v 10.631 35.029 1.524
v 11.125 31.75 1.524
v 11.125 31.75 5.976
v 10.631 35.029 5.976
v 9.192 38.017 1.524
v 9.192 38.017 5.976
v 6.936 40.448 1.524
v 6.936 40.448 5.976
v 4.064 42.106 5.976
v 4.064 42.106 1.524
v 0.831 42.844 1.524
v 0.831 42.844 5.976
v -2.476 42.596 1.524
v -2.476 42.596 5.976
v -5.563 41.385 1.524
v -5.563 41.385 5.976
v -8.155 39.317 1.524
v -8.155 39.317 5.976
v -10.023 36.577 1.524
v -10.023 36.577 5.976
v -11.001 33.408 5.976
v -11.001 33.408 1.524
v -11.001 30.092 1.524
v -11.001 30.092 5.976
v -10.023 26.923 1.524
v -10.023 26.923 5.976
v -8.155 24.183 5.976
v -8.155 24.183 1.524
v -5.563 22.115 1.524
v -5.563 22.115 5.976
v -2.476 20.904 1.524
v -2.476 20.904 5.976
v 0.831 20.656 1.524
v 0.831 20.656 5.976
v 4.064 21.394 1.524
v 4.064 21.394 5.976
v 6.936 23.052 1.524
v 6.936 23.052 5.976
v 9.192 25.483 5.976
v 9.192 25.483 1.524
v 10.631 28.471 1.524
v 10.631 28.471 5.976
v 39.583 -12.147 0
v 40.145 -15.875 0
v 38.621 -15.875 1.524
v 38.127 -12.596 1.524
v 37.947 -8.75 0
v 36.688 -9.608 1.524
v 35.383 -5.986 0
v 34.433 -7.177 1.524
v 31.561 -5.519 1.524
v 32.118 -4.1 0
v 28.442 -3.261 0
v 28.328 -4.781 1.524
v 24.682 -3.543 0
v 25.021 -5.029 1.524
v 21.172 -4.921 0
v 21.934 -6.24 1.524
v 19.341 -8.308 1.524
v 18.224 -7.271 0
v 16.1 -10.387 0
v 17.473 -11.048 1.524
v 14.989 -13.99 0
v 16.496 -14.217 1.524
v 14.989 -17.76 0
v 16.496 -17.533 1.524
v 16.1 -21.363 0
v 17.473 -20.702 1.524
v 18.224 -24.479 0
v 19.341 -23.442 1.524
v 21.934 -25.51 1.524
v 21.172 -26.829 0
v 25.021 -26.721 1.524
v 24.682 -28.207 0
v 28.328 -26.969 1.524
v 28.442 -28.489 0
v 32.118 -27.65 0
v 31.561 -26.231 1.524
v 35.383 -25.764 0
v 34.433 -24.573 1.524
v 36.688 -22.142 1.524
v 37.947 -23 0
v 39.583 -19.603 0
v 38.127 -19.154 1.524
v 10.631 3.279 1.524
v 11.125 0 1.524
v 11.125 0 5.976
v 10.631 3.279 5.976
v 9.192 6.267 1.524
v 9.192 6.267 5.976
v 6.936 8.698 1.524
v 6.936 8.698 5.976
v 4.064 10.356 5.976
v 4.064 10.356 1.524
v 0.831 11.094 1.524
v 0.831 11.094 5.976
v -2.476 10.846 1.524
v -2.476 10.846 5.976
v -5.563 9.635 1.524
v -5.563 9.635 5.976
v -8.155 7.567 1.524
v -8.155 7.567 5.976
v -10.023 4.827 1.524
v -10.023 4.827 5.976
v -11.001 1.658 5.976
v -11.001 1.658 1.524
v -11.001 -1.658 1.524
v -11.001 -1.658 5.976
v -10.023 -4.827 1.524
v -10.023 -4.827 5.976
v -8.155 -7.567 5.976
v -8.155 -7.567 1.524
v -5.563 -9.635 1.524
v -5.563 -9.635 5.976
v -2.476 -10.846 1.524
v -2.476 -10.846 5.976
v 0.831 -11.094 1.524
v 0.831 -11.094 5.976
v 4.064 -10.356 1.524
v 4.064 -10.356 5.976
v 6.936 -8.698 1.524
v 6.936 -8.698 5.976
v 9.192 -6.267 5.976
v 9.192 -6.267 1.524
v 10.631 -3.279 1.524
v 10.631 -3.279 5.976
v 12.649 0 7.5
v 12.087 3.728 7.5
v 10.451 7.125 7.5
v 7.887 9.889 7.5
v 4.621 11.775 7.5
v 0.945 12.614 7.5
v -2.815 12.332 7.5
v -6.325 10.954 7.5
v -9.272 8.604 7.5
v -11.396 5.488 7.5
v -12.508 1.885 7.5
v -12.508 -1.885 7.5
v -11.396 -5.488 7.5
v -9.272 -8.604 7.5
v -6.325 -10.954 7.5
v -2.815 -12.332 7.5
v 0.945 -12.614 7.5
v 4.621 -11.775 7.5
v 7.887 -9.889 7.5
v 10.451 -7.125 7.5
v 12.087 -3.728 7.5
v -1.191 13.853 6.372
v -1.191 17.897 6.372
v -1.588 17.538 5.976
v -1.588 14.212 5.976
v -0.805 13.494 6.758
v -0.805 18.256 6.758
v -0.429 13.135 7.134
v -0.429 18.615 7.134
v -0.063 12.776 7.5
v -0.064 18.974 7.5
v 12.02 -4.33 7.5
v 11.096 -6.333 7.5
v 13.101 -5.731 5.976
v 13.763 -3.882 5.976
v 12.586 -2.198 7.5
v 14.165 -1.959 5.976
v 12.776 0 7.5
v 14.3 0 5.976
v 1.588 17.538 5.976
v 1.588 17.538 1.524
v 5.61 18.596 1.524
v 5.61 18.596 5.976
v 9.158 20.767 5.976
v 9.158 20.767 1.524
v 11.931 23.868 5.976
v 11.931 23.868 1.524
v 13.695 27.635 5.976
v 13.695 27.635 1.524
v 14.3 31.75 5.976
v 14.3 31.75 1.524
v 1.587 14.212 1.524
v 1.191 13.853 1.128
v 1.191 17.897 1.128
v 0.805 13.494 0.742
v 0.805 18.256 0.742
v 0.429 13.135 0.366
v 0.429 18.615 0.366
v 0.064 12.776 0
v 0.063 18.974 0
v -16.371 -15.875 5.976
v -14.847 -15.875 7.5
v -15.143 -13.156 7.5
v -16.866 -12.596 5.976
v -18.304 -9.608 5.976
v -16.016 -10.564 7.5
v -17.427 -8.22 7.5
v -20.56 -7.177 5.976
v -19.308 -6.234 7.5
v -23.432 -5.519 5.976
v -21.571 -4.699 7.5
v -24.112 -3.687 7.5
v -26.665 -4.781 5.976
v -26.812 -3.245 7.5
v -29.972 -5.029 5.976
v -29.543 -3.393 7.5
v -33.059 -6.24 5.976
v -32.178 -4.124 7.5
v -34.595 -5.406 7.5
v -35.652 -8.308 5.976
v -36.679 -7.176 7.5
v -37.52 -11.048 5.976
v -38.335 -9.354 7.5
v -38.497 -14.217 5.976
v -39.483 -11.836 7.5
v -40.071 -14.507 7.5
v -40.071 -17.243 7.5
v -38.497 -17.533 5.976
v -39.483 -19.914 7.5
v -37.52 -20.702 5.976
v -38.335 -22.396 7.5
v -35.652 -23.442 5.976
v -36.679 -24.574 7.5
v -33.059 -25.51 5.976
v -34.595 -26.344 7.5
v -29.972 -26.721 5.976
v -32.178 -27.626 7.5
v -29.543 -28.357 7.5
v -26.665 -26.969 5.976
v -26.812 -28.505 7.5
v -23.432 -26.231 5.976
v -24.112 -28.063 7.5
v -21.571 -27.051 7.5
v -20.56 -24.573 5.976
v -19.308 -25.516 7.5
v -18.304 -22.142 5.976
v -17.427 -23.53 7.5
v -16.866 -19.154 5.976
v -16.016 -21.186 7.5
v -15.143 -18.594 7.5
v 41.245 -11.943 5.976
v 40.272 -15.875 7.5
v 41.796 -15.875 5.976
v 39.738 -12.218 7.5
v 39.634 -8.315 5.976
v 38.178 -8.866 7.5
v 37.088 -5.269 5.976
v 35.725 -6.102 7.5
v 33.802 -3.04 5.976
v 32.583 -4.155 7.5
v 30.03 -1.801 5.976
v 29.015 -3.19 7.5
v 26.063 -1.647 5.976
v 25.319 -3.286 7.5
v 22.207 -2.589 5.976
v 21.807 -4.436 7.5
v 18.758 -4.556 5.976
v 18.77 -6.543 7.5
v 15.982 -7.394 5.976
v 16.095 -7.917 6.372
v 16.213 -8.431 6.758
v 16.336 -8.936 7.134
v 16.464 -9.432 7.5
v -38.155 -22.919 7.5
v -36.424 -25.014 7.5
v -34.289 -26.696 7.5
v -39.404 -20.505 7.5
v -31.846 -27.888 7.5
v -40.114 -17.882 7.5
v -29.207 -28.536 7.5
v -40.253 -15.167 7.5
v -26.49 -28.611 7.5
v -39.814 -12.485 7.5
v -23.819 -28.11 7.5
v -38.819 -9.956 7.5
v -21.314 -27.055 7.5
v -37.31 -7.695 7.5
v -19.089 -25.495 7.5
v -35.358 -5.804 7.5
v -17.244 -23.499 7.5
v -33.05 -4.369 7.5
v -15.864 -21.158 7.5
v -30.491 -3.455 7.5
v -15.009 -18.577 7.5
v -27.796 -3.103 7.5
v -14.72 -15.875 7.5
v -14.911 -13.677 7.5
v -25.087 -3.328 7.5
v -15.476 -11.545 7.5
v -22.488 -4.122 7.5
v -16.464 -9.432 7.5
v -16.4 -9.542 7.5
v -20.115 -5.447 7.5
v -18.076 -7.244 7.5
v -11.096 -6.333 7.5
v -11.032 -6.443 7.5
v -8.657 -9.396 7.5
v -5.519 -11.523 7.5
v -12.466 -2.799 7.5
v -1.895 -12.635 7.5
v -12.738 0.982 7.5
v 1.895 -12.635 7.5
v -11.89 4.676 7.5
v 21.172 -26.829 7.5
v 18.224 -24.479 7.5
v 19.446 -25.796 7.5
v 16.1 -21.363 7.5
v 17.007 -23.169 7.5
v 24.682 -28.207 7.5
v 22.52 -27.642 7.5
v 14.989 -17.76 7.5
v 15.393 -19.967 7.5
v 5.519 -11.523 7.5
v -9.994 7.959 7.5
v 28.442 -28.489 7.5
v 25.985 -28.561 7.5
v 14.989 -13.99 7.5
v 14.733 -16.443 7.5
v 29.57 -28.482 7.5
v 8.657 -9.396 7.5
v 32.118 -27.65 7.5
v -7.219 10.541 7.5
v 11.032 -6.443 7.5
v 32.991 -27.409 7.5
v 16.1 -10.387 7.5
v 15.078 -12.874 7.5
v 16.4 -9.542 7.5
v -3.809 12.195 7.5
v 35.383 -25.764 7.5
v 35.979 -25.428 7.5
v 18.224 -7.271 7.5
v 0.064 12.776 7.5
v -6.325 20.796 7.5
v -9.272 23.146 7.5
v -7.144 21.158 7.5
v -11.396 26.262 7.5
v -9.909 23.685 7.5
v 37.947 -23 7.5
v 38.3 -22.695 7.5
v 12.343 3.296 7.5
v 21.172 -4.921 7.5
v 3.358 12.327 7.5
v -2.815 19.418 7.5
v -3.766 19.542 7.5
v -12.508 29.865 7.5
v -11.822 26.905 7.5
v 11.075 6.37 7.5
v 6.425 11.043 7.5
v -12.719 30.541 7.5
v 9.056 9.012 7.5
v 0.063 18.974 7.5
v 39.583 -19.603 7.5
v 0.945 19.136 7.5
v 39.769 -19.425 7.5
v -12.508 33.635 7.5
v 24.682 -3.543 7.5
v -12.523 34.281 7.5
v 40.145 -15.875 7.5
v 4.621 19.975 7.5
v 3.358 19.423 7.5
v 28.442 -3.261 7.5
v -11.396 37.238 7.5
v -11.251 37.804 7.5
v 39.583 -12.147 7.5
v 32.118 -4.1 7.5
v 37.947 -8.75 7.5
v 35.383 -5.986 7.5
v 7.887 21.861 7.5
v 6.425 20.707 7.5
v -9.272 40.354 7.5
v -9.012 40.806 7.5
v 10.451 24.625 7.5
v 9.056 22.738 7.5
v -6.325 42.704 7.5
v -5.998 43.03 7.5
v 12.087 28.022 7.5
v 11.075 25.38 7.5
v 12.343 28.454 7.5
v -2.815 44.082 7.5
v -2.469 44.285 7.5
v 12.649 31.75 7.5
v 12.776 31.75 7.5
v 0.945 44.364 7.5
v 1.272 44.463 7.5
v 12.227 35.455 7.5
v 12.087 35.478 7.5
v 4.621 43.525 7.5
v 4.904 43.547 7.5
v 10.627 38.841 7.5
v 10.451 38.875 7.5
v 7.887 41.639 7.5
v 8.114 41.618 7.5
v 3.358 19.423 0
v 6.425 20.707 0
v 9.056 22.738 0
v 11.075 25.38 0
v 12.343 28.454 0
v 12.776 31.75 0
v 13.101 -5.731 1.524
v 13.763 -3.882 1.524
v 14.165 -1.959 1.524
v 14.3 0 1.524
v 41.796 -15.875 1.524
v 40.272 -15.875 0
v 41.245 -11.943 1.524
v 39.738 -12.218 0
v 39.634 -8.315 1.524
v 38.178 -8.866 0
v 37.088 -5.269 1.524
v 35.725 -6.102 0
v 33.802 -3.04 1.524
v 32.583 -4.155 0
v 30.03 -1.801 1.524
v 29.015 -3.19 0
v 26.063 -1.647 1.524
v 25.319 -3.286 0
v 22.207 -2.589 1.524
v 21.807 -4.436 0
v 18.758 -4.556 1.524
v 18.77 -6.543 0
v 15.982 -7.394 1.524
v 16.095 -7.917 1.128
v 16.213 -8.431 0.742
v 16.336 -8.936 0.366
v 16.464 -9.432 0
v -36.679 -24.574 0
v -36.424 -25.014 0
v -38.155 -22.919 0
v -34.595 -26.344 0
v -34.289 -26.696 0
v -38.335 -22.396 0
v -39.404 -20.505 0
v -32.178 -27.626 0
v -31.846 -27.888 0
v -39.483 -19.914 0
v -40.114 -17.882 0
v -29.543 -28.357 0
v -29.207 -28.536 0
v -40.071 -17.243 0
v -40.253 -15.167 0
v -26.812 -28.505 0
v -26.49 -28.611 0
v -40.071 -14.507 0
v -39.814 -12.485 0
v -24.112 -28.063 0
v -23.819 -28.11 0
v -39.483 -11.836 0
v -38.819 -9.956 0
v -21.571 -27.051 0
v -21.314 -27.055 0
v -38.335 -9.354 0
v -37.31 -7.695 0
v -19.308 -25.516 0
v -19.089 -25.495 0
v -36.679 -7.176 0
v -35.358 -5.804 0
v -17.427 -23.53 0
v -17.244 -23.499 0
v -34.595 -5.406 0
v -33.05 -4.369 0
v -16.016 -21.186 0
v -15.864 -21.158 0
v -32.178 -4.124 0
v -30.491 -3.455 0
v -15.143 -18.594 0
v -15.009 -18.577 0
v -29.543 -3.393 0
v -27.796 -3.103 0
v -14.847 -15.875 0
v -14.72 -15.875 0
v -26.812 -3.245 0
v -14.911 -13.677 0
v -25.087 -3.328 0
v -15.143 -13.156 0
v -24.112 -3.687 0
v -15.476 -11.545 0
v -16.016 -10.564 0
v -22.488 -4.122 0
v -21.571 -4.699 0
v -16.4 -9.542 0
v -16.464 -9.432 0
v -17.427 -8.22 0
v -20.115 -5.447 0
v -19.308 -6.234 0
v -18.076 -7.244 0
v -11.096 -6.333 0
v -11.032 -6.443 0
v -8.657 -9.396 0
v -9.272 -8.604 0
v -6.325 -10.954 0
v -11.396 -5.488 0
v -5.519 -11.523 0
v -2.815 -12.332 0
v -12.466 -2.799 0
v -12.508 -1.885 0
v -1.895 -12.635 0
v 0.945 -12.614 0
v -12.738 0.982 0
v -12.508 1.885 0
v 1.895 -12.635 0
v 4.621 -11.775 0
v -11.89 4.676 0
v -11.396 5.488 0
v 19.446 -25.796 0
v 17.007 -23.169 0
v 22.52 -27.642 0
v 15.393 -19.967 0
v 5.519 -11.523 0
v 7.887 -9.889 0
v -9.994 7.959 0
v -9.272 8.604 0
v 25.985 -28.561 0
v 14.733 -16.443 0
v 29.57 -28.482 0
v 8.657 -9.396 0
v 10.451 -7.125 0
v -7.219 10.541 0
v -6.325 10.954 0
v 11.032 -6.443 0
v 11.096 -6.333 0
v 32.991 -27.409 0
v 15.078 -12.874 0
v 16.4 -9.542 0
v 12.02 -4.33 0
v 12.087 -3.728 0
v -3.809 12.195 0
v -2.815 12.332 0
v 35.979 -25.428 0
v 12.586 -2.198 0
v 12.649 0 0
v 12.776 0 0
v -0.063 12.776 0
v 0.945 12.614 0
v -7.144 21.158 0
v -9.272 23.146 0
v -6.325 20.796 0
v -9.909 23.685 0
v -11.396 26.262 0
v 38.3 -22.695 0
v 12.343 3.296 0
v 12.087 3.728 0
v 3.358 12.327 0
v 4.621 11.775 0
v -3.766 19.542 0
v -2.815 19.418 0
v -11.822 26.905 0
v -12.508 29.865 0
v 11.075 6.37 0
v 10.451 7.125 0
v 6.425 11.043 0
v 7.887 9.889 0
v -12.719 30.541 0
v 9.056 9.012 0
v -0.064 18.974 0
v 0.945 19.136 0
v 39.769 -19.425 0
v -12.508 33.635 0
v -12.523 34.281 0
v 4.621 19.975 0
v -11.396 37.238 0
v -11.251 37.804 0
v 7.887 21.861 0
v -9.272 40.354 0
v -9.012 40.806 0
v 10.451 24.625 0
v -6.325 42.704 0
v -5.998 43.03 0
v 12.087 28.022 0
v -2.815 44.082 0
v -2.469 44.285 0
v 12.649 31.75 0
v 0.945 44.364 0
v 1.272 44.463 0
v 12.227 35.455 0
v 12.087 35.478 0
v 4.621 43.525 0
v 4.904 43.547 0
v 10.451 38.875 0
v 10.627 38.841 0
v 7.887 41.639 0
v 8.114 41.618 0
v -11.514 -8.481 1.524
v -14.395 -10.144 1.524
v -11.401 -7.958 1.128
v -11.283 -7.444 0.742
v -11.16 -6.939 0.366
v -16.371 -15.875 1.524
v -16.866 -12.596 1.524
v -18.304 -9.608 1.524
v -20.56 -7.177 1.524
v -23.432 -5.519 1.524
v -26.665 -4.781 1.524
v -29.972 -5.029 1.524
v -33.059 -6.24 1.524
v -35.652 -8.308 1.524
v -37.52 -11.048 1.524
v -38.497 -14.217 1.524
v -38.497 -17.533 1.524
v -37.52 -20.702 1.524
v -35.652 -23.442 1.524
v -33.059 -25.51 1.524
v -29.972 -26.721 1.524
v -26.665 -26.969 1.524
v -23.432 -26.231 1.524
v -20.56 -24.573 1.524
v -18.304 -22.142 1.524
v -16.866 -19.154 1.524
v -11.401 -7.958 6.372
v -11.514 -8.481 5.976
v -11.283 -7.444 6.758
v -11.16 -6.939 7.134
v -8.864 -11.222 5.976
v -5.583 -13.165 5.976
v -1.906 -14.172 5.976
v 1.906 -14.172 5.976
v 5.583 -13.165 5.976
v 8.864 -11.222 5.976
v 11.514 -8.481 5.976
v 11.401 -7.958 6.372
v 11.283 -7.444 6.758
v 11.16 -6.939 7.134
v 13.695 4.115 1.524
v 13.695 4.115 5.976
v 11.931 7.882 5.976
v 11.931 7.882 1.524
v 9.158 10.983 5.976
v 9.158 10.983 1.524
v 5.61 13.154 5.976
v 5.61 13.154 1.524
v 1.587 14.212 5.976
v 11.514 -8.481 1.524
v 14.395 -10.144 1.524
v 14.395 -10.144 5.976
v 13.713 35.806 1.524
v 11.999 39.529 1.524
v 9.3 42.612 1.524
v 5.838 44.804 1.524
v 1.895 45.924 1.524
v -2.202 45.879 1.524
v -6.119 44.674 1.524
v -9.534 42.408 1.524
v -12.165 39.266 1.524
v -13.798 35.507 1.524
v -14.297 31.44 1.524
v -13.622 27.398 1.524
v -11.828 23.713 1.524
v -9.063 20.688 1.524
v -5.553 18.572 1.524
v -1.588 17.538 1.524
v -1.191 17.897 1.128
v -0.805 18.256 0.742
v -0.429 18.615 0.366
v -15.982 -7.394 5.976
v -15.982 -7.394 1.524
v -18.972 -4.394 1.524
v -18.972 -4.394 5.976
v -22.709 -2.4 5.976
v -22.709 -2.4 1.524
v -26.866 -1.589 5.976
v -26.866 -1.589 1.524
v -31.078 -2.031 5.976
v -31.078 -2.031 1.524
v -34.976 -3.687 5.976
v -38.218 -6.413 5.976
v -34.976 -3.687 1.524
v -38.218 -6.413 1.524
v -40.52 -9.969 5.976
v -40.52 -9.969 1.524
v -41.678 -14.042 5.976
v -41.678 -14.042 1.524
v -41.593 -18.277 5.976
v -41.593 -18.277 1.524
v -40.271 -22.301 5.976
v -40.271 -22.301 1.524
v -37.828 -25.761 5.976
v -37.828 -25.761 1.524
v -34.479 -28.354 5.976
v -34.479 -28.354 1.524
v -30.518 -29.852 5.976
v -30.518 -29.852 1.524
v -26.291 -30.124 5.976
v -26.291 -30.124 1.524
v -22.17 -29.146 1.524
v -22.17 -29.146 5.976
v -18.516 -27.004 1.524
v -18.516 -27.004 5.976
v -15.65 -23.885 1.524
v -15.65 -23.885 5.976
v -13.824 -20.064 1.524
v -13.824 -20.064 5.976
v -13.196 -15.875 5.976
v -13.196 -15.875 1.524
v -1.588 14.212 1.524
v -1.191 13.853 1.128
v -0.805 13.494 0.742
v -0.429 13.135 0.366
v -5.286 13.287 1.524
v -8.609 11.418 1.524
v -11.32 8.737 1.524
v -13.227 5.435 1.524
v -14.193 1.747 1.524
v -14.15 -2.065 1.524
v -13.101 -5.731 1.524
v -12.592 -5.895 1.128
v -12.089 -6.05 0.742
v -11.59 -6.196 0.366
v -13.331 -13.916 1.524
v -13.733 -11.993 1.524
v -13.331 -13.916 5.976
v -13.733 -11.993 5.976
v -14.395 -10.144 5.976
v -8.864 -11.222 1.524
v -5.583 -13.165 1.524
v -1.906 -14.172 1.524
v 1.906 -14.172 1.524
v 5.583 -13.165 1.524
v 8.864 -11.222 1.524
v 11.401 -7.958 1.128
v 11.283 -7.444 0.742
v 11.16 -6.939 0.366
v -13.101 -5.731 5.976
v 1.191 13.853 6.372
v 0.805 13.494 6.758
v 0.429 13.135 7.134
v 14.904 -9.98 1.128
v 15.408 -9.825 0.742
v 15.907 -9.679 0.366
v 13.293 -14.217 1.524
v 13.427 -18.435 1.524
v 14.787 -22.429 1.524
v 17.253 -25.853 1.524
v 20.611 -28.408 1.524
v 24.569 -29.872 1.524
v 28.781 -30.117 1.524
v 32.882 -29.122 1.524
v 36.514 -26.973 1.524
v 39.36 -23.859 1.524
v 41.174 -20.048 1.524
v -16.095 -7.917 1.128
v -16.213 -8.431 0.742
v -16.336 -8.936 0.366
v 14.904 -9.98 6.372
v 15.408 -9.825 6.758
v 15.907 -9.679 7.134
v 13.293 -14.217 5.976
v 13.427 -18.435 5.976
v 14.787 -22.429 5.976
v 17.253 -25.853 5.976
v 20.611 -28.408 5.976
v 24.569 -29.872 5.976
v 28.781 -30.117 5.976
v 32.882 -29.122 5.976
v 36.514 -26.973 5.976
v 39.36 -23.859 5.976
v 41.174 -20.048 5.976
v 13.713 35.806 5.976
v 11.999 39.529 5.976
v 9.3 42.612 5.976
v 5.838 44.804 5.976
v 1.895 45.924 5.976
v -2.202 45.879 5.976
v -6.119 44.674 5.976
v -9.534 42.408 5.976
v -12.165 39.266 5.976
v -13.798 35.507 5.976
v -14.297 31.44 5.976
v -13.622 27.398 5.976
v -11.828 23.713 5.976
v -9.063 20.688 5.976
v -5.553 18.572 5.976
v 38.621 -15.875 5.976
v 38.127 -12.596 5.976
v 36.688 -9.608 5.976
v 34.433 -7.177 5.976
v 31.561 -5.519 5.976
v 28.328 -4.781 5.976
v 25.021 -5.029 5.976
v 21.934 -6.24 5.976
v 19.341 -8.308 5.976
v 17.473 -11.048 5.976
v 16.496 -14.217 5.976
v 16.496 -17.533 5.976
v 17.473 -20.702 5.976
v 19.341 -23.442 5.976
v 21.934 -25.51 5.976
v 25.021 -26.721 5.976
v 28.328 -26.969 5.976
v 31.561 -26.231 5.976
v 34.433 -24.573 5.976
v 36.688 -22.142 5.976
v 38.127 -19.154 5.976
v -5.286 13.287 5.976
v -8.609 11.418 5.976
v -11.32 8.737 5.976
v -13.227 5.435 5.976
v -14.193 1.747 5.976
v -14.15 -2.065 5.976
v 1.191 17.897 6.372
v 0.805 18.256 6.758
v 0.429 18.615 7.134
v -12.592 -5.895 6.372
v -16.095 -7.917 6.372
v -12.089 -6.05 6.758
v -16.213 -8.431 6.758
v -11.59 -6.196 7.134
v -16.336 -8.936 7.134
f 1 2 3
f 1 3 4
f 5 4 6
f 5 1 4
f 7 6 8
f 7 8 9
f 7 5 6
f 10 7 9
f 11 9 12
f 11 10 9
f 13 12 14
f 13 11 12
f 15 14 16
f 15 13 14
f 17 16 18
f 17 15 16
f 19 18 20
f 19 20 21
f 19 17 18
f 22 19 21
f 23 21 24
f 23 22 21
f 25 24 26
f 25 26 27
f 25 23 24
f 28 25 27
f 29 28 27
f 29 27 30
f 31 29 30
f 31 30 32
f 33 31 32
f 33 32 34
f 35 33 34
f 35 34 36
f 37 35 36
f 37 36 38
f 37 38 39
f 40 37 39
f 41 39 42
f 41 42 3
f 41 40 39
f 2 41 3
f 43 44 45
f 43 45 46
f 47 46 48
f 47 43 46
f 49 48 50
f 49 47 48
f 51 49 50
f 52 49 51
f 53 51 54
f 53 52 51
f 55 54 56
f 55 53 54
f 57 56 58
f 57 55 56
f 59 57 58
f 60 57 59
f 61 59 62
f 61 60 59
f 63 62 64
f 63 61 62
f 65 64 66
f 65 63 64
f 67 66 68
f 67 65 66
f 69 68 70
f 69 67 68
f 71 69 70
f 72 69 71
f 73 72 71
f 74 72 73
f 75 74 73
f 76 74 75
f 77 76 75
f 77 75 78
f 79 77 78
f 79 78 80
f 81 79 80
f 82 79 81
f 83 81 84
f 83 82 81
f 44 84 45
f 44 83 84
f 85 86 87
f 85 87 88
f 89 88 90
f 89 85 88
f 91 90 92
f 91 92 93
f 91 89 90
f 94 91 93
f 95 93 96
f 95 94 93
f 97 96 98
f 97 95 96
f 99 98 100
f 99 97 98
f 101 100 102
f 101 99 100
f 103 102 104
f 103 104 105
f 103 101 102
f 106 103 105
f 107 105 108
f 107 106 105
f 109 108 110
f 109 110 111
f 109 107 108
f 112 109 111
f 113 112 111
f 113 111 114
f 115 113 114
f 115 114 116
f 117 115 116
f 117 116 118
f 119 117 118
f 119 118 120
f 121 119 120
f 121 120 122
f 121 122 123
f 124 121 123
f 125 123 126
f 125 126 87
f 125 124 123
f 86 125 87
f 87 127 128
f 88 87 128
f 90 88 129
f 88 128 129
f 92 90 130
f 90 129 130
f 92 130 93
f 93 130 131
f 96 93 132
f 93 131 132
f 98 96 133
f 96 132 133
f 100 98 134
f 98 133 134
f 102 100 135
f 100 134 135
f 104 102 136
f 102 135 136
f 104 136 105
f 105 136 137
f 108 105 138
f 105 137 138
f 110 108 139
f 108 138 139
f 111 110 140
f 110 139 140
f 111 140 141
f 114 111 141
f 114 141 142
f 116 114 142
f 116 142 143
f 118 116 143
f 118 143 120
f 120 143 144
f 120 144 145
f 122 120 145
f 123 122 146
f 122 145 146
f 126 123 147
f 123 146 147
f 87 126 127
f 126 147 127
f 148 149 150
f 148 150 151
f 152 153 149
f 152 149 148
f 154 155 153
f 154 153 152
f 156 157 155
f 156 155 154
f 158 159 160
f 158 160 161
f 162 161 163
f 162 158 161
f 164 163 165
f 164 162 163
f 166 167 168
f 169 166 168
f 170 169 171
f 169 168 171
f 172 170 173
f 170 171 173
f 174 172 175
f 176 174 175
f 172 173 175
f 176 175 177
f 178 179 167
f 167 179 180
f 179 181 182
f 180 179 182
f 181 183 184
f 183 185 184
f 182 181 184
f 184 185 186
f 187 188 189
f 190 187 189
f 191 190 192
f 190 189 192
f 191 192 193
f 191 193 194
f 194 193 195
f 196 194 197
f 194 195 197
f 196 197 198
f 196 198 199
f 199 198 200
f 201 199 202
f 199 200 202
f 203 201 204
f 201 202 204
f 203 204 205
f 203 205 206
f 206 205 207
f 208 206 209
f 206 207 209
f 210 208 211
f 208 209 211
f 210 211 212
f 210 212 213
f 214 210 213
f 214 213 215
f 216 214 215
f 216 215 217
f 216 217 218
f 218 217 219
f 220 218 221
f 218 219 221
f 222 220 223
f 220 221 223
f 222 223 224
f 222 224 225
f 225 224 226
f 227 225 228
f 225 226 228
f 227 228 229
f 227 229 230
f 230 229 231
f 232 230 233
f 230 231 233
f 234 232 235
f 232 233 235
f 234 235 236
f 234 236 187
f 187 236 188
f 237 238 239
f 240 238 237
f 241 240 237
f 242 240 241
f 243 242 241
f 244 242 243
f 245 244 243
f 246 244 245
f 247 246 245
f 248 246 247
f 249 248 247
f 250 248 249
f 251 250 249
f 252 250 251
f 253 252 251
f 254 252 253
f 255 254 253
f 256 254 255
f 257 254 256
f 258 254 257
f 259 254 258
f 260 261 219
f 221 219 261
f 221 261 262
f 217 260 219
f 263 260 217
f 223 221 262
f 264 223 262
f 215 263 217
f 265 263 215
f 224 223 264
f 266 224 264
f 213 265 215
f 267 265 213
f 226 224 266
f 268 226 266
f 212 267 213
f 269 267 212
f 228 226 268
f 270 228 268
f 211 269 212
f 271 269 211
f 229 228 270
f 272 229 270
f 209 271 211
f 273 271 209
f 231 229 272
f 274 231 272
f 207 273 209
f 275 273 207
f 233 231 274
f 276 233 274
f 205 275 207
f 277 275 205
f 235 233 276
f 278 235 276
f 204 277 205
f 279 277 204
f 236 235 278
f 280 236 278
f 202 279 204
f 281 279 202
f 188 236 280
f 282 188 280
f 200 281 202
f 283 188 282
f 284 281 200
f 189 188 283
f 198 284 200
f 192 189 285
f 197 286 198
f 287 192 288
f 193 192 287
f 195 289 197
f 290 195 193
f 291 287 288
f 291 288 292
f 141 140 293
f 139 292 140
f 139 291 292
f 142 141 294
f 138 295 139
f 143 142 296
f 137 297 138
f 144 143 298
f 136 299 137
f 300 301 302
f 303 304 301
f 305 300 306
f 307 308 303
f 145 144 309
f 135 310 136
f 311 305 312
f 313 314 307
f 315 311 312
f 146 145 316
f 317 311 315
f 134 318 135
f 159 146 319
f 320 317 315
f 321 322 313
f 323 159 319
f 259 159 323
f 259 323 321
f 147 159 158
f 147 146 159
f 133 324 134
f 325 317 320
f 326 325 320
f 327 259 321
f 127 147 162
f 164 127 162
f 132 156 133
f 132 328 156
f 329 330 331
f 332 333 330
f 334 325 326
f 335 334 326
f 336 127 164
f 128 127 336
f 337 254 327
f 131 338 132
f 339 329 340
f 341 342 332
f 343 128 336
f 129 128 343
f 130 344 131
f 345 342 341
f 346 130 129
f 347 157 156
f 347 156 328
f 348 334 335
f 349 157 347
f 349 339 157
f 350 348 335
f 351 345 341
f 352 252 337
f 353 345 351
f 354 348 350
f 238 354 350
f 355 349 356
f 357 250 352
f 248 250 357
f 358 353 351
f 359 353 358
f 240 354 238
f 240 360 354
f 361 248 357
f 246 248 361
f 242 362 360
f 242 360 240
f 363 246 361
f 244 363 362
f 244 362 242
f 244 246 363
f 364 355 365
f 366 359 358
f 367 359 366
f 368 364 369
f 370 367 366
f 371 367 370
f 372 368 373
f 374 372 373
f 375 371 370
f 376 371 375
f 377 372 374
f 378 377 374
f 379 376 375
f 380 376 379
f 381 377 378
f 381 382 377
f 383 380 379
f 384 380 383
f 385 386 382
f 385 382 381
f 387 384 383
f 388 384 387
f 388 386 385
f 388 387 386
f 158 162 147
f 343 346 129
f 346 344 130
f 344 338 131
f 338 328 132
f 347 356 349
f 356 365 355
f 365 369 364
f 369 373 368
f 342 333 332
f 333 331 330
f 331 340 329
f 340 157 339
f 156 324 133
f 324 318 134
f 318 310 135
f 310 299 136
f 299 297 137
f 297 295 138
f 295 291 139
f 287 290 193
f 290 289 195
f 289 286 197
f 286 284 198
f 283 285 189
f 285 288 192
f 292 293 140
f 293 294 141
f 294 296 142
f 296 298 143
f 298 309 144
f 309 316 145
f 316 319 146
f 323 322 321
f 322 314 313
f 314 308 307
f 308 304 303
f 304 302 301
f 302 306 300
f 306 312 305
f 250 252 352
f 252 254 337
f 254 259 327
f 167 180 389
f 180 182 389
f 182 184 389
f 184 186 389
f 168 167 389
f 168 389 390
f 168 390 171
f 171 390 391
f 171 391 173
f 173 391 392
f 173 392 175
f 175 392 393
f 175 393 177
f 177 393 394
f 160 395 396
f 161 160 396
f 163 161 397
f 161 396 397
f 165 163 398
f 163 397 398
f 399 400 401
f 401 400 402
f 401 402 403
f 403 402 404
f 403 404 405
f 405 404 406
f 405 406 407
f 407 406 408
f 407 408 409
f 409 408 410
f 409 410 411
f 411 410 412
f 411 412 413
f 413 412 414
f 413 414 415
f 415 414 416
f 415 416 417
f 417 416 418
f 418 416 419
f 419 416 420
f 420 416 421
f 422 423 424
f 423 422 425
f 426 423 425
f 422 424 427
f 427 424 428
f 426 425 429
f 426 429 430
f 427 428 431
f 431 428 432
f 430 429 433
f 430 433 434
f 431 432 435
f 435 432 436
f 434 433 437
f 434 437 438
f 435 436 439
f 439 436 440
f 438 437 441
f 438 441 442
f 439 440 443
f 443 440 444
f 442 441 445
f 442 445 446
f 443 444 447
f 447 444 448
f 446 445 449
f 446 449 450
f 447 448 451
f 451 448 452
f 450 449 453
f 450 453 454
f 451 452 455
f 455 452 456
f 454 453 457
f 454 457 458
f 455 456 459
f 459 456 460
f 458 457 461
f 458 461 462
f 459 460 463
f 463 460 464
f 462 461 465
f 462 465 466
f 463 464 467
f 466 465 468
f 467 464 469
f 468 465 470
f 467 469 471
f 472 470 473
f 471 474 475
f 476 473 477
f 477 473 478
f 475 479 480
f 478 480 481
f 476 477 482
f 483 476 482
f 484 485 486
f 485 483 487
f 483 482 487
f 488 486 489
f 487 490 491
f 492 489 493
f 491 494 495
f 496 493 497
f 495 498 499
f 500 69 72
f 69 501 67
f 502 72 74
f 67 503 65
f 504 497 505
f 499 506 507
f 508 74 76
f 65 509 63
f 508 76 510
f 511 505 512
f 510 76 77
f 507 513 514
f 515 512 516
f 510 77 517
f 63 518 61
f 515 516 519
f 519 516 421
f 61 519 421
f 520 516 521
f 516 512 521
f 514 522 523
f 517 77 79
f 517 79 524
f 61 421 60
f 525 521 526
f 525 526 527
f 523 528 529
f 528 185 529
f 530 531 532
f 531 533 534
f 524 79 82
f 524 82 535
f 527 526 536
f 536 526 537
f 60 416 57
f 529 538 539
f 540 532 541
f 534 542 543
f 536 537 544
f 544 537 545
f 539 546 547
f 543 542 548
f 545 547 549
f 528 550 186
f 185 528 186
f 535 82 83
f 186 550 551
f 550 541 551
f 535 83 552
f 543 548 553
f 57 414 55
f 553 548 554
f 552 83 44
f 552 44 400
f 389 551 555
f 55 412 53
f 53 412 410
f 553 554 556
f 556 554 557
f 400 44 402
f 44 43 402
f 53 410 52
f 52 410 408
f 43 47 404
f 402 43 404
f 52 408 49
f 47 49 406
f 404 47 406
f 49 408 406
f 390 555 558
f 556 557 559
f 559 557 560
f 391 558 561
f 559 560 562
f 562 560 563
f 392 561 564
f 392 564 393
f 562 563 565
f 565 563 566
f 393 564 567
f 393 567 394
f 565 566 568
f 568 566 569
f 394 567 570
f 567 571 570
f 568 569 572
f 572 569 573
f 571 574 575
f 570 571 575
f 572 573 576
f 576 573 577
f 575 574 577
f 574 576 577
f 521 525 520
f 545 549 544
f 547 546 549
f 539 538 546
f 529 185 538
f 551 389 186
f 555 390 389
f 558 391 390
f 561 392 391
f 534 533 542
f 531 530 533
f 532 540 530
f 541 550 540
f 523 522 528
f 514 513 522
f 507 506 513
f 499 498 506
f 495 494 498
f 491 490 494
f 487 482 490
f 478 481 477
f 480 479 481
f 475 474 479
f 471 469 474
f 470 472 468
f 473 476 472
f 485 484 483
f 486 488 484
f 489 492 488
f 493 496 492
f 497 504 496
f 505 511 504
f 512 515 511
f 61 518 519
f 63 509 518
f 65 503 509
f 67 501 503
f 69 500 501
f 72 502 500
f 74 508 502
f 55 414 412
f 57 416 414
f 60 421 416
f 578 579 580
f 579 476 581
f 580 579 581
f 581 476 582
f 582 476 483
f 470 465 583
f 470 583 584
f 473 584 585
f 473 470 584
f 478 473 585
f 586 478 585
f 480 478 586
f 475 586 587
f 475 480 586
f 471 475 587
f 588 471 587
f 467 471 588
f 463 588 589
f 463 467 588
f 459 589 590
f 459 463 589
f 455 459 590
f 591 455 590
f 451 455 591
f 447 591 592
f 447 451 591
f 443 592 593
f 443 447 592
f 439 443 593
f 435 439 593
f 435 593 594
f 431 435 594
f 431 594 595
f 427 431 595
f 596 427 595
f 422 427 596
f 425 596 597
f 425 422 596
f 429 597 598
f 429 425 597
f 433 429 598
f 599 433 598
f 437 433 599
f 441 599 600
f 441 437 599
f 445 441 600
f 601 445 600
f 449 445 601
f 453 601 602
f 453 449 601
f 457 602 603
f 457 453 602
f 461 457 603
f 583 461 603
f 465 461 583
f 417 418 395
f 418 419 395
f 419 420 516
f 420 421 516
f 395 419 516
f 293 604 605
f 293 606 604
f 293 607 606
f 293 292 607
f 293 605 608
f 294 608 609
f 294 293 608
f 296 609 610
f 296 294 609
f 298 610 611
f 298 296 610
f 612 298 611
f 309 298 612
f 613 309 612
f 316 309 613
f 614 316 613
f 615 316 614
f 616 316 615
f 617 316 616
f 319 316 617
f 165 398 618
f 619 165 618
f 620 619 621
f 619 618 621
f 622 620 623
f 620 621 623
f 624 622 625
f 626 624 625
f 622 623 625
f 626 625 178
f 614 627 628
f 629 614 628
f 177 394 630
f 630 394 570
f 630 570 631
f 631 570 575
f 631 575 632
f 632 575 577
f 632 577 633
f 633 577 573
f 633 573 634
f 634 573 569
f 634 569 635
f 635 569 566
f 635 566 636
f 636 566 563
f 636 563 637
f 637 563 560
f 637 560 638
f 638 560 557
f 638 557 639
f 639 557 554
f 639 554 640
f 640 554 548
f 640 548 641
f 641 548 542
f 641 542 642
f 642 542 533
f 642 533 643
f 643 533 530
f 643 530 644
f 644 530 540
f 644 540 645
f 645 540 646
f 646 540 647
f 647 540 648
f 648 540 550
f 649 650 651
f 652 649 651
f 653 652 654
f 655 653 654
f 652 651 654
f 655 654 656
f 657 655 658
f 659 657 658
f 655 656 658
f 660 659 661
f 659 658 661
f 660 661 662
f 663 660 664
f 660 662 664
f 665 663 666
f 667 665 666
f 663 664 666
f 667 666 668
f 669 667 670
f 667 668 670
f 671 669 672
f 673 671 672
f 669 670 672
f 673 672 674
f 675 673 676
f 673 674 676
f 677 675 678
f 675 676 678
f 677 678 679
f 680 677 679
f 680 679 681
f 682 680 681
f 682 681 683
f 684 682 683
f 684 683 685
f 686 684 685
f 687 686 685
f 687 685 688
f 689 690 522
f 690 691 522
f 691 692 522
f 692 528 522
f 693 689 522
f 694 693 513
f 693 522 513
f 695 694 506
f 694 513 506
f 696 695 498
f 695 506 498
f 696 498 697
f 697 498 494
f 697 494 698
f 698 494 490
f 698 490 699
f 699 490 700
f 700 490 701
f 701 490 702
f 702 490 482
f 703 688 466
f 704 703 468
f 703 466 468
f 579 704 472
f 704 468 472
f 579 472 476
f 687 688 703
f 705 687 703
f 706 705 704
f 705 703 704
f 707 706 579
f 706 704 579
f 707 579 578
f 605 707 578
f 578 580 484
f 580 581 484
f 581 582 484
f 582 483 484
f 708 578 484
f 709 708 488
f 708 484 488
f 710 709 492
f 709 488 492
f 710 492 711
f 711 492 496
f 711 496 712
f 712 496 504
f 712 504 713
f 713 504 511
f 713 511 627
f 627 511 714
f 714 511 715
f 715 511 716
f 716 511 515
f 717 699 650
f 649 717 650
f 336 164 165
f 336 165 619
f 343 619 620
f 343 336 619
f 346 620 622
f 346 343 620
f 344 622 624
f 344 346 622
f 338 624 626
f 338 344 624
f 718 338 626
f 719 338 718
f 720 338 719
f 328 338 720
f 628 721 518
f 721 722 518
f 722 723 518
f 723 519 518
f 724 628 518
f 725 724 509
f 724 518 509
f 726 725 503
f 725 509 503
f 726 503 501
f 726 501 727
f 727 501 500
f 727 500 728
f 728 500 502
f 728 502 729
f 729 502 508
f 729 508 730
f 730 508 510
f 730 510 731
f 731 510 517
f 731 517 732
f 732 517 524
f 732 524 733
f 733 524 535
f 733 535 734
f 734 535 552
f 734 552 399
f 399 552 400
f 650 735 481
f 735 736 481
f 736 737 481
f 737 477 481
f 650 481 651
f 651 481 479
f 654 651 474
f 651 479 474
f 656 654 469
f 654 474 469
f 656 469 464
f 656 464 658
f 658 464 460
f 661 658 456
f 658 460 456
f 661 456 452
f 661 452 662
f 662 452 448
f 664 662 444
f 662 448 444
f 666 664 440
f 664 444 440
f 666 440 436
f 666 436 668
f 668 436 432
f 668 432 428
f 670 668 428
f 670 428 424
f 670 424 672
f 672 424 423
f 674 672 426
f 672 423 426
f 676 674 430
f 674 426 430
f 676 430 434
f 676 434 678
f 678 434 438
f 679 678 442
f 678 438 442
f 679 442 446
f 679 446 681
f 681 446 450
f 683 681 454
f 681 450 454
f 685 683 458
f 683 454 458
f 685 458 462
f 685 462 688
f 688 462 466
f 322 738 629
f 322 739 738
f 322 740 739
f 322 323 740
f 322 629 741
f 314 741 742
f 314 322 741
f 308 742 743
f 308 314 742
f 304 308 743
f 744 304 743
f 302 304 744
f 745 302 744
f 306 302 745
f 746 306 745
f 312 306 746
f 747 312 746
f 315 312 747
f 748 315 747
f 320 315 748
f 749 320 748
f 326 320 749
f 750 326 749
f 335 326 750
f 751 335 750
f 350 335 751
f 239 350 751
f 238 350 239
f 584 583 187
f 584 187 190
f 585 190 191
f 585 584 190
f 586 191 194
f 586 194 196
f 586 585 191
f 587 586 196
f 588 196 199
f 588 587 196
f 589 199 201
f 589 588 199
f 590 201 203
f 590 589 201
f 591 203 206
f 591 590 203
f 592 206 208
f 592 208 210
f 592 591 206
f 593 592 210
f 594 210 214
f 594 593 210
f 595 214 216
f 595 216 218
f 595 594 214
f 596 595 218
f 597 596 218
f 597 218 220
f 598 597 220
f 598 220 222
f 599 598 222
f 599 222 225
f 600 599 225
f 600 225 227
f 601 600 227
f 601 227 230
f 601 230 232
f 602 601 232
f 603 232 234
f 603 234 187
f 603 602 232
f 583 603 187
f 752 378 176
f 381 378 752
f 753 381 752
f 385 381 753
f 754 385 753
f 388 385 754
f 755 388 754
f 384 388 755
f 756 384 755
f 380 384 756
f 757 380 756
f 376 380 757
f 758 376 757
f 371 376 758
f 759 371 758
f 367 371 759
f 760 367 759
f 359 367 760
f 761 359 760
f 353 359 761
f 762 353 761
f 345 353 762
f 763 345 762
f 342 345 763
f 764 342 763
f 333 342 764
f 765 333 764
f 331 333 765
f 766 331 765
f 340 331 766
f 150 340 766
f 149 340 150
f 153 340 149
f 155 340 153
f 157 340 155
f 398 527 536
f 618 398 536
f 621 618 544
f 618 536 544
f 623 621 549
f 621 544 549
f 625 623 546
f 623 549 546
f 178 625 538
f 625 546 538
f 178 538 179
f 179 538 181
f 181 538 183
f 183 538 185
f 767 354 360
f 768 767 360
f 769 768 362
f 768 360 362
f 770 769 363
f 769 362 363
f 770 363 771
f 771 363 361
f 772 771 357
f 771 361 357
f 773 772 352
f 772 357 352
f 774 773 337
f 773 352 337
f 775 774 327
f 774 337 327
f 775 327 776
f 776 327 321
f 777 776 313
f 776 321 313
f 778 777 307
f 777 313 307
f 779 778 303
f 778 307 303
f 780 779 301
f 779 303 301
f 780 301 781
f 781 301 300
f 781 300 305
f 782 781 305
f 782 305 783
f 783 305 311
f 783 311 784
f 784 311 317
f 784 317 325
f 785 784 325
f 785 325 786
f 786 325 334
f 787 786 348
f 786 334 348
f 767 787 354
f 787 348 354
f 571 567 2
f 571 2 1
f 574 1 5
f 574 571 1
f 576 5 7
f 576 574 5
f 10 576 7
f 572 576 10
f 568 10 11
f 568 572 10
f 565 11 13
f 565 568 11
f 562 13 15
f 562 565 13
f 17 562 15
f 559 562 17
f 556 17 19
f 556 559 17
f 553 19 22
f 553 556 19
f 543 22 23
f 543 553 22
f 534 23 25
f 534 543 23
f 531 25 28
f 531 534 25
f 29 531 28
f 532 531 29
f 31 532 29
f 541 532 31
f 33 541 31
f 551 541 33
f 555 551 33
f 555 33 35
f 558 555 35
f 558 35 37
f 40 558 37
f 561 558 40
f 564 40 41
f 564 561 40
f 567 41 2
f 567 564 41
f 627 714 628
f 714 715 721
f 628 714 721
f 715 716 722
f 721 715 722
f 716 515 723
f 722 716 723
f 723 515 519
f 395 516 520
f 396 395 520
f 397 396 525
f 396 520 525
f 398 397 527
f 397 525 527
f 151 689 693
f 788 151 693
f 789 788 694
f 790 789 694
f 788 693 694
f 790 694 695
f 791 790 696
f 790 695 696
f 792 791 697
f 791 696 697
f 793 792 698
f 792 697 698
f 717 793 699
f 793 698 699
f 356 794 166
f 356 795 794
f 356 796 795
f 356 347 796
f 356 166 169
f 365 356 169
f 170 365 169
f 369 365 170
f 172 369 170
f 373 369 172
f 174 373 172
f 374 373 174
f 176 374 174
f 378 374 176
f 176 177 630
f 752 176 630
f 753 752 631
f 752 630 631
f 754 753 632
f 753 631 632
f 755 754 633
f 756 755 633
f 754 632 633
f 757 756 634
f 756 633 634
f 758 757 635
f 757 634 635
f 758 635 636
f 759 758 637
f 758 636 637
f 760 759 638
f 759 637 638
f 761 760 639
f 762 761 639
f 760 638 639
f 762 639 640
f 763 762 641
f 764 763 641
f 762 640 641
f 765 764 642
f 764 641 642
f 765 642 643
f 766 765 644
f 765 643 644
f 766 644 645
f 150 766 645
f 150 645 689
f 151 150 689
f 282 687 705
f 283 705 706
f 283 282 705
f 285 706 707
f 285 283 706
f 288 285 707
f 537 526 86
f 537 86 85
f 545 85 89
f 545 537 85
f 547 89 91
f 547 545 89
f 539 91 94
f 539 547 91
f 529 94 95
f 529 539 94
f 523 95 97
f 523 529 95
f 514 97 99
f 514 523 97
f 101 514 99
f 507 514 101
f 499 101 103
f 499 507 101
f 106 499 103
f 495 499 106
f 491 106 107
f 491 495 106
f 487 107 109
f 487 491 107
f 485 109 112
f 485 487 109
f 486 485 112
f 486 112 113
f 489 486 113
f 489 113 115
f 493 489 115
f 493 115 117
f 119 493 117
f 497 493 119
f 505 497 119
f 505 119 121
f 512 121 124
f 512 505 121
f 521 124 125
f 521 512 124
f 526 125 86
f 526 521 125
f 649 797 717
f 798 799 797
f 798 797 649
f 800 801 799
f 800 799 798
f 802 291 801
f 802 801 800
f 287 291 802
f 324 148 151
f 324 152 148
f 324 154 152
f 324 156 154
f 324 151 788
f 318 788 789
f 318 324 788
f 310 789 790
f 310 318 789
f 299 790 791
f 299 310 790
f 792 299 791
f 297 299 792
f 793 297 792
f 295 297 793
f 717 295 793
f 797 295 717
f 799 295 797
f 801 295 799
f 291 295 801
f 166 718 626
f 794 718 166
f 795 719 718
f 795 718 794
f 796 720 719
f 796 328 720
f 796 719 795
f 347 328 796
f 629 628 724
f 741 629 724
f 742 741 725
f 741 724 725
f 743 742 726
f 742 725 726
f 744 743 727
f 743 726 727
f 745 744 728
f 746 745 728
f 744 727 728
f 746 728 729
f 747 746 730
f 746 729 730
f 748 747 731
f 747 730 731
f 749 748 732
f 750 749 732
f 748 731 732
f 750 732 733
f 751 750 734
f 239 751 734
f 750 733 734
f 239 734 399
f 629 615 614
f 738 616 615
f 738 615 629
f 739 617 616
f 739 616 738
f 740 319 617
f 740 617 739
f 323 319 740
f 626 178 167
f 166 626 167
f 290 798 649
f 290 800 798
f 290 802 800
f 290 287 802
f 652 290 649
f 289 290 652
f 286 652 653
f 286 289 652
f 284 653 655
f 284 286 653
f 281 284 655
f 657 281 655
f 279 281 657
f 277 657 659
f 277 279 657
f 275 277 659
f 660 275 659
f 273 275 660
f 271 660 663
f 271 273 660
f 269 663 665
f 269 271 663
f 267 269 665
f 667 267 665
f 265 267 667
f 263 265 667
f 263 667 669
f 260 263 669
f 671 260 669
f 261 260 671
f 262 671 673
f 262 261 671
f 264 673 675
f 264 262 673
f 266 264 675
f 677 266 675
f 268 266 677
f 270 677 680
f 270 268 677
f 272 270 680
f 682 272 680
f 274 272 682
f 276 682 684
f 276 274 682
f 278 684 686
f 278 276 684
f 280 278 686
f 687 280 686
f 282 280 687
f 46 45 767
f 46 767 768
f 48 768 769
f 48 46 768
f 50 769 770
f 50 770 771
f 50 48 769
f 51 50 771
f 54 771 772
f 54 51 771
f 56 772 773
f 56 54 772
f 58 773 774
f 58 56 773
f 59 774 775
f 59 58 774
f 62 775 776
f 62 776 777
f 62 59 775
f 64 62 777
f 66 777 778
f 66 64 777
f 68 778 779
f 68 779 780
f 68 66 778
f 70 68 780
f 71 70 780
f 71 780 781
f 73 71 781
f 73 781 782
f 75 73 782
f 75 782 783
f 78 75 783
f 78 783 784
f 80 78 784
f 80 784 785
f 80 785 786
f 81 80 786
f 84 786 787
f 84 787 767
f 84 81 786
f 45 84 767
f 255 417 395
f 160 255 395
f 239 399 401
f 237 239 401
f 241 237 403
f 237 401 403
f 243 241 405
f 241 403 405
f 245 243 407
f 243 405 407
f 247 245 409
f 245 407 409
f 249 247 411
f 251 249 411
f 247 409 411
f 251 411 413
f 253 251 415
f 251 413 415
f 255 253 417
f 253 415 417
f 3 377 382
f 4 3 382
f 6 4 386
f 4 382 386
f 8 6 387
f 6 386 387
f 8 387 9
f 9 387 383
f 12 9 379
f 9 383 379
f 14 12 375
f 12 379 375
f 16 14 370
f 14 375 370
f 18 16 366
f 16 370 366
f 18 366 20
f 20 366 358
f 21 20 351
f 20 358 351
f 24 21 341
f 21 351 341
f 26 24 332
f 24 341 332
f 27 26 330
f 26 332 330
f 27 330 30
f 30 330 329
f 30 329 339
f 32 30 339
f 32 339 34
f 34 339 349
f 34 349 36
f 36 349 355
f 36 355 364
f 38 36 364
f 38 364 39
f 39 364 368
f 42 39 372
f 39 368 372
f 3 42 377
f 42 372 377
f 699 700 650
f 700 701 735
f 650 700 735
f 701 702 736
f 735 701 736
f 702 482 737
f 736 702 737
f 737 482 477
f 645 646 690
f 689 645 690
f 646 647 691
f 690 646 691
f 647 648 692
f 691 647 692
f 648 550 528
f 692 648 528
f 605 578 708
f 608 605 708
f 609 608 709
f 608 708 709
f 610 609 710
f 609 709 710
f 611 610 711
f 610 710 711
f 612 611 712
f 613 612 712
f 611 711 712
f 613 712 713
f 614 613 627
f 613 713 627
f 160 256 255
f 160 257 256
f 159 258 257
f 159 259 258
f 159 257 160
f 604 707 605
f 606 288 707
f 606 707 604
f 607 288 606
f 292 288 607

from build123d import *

# Parameters (mm, degrees)
F0_R     = 11.125
F1_DEPTH = 7.5
F2_SIZE  = 1.524


with BuildPart() as f1:
    # F0 (on Top) → F1 (new body)
    with BuildSketch(Plane.XY):
        with BuildLine():
            ThreePointArc((13.1013648304, -5.7309894069), (13.9971339401, -2.9274974745), (14.3, 0))
            ThreePointArc((14.3, 0), (10.6581248351, 9.5338541524), (1.5875, 14.2116094708))
            Line((1.5875, 14.2116094708), (1.5875, 12.7125))
            Line((1.5875, 12.7125), (-1.5875, 12.7125))
            Line((-1.5875, 12.7125), (-1.5875, 14.2116094708))
            ThreePointArc((-1.5875, 14.2116094708), (-12.3841632741, 7.15), (-13.1013648304, -5.7309894069))
            Line((-13.1013648304, -5.7309894069), (-11.8030979456, -4.9814346715))
            Line((-11.8030979456, -4.9814346715), (-10.2155979456, -7.7310653285))
            Line((-10.2155979456, -7.7310653285), (-11.5138648304, -8.4806200639))
            ThreePointArc((-11.5138648304, -8.4806200639), (0, -14.3), (11.5138648304, -8.4806200639))
            Line((11.5138648304, -8.4806200639), (10.2155979456, -7.7310653285))
            Line((10.2155979456, -7.7310653285), (11.8030979456, -4.9814346715))
            Line((11.8030979456, -4.9814346715), (13.1013648304, -5.7309894069))
        make_face()
        Circle(F0_R, mode=Mode.SUBTRACT)
        with BuildLine():
            Line((1.5875, 12.7125), (1.5875, 14.2116094708))
            ThreePointArc((1.5875, 14.2116094708), (0, 14.3), (-1.5875, 14.2116094708))
            Line((-1.5875, 14.2116094708), (-1.5875, 12.7125))
            Line((-1.5875, 12.7125), (1.5875, 12.7125))
        make_face()
        with BuildLine():
            ThreePointArc((-1.5875, 14.2116094708), (0, 14.3), (1.5875, 14.2116094708))
            Line((1.5875, 14.2116094708), (1.5875, 17.5383905292))
            ThreePointArc((1.5875, 17.5383905292), (0, 17.45), (-1.5875, 17.5383905292))
            Line((-1.5875, 17.5383905292), (-1.5875, 14.2116094708))
        make_face()
        with BuildLine():
            Line((15.9824417398, -7.3943799361), (13.1013648304, -5.7309894069))
            ThreePointArc((13.1013648304, -5.7309894069), (12.3841632741, -7.15), (11.5138648304, -8.4806200639))
            Line((11.5138648304, -8.4806200639), (14.3949417398, -10.1440105931))
            ThreePointArc((14.3949417398, -10.1440105931), (15.112143296, -8.725), (15.9824417398, -7.3943799361))
        make_face()
        with BuildLine():
            ThreePointArc((11.5138648304, -8.4806200639), (12.3841632741, -7.15), (13.1013648304, -5.7309894069))
            Line((13.1013648304, -5.7309894069), (11.8030979456, -4.9814346715))
            Line((11.8030979456, -4.9814346715), (10.2155979456, -7.7310653285))
            Line((10.2155979456, -7.7310653285), (11.5138648304, -8.4806200639))
        make_face()
        with BuildLine():
            Line((1.5875, 19.0375), (1.5875, 17.5383905292))
            ThreePointArc((1.5875, 17.5383905292), (10.6581248351, 22.2161458476), (14.3, 31.75))
            ThreePointArc((14.3, 31.75), (-9.5338541524, 42.4081248351), (-1.5875, 17.5383905292))
            Line((-1.5875, 17.5383905292), (-1.5875, 19.0375))
            Line((-1.5875, 19.0375), (1.5875, 19.0375))
        make_face()
        with Locations((0, 31.75)):
            Circle(F0_R, mode=Mode.SUBTRACT)
        with BuildLine():
            ThreePointArc((-1.5875, 17.5383905292), (0, 17.45), (1.5875, 17.5383905292))
            Line((1.5875, 17.5383905292), (1.5875, 19.0375))
            Line((1.5875, 19.0375), (-1.5875, 19.0375))
            Line((-1.5875, 19.0375), (-1.5875, 17.5383905292))
        make_face()
        with BuildLine():
            Line((17.2807086245, -8.1439346715), (15.9824417398, -7.3943799361))
            ThreePointArc((15.9824417398, -7.3943799361), (15.112143296, -8.725), (14.3949417398, -10.1440105931))
            Line((14.3949417398, -10.1440105931), (15.6932086245, -10.8935653285))
            Line((15.6932086245, -10.8935653285), (17.2807086245, -8.1439346715))
        make_face()
        with BuildLine():
            ThreePointArc((41.7963065702, -15.875), (31.9595863578, -2.2893776905), (15.9824417398, -7.3943799361))
            Line((15.9824417398, -7.3943799361), (17.2807086245, -8.1439346715))
            Line((17.2807086245, -8.1439346715), (15.6932086245, -10.8935653285))
            Line((15.6932086245, -10.8935653285), (14.3949417398, -10.1440105931))
            ThreePointArc((14.3949417398, -10.1440105931), (24.5688090957, -29.8721339401), (41.7963065702, -15.875))
        make_face()
        with Locations((27.4963065702, -15.875)):
            Circle(F0_R, mode=Mode.SUBTRACT)
        with BuildLine():
            Line((-11.8030979456, -4.9814346715), (-13.1013648304, -5.7309894069))
            ThreePointArc((-13.1013648304, -5.7309894069), (-12.3841632741, -7.15), (-11.5138648304, -8.4806200639))
            Line((-11.5138648304, -8.4806200639), (-10.2155979456, -7.7310653285))
            Line((-10.2155979456, -7.7310653285), (-11.8030979456, -4.9814346715))
        make_face()
        with BuildLine():
            ThreePointArc((-11.5138648304, -8.4806200639), (-12.3841632741, -7.15), (-13.1013648304, -5.7309894069))
            Line((-13.1013648304, -5.7309894069), (-15.9824417398, -7.3943799361))
            ThreePointArc((-15.9824417398, -7.3943799361), (-15.112143296, -8.725), (-14.3949417398, -10.1440105931))
            Line((-14.3949417398, -10.1440105931), (-11.5138648304, -8.4806200639))
        make_face()
        with BuildLine():
            Line((-17.2807086245, -8.1439346715), (-15.9824417398, -7.3943799361))
            ThreePointArc((-15.9824417398, -7.3943799361), (-41.0819288797, -20.3382797877), (-13.1963065702, -15.875))
            ThreePointArc((-13.1963065702, -15.875), (-13.4991726301, -12.9475025255), (-14.3949417398, -10.1440105931))
            Line((-14.3949417398, -10.1440105931), (-15.6932086245, -10.8935653285))
            Line((-15.6932086245, -10.8935653285), (-17.2807086245, -8.1439346715))
        make_face()
        with Locations((-27.4963065702, -15.875)):
            Circle(F0_R, mode=Mode.SUBTRACT)
        with BuildLine():
            ThreePointArc((-14.3949417398, -10.1440105931), (-15.112143296, -8.725), (-15.9824417398, -7.3943799361))
            Line((-15.9824417398, -7.3943799361), (-17.2807086245, -8.1439346715))
            Line((-17.2807086245, -8.1439346715), (-15.6932086245, -10.8935653285))
            Line((-15.6932086245, -10.8935653285), (-14.3949417398, -10.1440105931))
        make_face()
    extrude(amount=F1_DEPTH)

    # F2
    f2_edges = [f1.edges().sort_by_distance(p)[0] for p in [
        (12.384163, 7.15, 7.5),
        (1.5875, 15.875, 7.5),
        (0, 46.05, 7.5),
        (-1.5875, 15.875, 7.5),
        (-12.384163, 7.15, 7.5),
        (-14.541903, -6.562685, 7.5),
        (-39.88047, -23.025, 7.5),
        (-12.954403, -9.312315, 7.5),
        (0, -14.3, 7.5),
        (12.954403, -9.312315, 7.5),
        (39.88047, -23.025, 7.5),
        (14.541903, -6.562685, 7.5),
        (-11.125, 0, 7.5),
        (-11.125, 31.75, 7.5),
        (16.371307, -15.875, 7.5),
        (-38.621307, -15.875, 7.5),
        (12.384163, 7.15, 0),
        (1.5875, 15.875, 0),
        (0, 46.05, 0),
        (-1.5875, 15.875, 0),
        (-12.384163, 7.15, 0),
        (-14.541903, -6.562685, 0),
        (-39.88047, -23.025, 0),
        (-12.954403, -9.312315, 0),
        (0, -14.3, 0),
        (12.954403, -9.312315, 0),
        (39.88047, -23.025, 0),
        (14.541903, -6.562685, 0),
        (-11.125, 0, 0),
        (-11.125, 31.75, 0),
        (16.371307, -15.875, 0),
        (-38.621307, -15.875, 0),
    ]]
    chamfer(f2_edges, length=F2_SIZE)


solid = f1.part
